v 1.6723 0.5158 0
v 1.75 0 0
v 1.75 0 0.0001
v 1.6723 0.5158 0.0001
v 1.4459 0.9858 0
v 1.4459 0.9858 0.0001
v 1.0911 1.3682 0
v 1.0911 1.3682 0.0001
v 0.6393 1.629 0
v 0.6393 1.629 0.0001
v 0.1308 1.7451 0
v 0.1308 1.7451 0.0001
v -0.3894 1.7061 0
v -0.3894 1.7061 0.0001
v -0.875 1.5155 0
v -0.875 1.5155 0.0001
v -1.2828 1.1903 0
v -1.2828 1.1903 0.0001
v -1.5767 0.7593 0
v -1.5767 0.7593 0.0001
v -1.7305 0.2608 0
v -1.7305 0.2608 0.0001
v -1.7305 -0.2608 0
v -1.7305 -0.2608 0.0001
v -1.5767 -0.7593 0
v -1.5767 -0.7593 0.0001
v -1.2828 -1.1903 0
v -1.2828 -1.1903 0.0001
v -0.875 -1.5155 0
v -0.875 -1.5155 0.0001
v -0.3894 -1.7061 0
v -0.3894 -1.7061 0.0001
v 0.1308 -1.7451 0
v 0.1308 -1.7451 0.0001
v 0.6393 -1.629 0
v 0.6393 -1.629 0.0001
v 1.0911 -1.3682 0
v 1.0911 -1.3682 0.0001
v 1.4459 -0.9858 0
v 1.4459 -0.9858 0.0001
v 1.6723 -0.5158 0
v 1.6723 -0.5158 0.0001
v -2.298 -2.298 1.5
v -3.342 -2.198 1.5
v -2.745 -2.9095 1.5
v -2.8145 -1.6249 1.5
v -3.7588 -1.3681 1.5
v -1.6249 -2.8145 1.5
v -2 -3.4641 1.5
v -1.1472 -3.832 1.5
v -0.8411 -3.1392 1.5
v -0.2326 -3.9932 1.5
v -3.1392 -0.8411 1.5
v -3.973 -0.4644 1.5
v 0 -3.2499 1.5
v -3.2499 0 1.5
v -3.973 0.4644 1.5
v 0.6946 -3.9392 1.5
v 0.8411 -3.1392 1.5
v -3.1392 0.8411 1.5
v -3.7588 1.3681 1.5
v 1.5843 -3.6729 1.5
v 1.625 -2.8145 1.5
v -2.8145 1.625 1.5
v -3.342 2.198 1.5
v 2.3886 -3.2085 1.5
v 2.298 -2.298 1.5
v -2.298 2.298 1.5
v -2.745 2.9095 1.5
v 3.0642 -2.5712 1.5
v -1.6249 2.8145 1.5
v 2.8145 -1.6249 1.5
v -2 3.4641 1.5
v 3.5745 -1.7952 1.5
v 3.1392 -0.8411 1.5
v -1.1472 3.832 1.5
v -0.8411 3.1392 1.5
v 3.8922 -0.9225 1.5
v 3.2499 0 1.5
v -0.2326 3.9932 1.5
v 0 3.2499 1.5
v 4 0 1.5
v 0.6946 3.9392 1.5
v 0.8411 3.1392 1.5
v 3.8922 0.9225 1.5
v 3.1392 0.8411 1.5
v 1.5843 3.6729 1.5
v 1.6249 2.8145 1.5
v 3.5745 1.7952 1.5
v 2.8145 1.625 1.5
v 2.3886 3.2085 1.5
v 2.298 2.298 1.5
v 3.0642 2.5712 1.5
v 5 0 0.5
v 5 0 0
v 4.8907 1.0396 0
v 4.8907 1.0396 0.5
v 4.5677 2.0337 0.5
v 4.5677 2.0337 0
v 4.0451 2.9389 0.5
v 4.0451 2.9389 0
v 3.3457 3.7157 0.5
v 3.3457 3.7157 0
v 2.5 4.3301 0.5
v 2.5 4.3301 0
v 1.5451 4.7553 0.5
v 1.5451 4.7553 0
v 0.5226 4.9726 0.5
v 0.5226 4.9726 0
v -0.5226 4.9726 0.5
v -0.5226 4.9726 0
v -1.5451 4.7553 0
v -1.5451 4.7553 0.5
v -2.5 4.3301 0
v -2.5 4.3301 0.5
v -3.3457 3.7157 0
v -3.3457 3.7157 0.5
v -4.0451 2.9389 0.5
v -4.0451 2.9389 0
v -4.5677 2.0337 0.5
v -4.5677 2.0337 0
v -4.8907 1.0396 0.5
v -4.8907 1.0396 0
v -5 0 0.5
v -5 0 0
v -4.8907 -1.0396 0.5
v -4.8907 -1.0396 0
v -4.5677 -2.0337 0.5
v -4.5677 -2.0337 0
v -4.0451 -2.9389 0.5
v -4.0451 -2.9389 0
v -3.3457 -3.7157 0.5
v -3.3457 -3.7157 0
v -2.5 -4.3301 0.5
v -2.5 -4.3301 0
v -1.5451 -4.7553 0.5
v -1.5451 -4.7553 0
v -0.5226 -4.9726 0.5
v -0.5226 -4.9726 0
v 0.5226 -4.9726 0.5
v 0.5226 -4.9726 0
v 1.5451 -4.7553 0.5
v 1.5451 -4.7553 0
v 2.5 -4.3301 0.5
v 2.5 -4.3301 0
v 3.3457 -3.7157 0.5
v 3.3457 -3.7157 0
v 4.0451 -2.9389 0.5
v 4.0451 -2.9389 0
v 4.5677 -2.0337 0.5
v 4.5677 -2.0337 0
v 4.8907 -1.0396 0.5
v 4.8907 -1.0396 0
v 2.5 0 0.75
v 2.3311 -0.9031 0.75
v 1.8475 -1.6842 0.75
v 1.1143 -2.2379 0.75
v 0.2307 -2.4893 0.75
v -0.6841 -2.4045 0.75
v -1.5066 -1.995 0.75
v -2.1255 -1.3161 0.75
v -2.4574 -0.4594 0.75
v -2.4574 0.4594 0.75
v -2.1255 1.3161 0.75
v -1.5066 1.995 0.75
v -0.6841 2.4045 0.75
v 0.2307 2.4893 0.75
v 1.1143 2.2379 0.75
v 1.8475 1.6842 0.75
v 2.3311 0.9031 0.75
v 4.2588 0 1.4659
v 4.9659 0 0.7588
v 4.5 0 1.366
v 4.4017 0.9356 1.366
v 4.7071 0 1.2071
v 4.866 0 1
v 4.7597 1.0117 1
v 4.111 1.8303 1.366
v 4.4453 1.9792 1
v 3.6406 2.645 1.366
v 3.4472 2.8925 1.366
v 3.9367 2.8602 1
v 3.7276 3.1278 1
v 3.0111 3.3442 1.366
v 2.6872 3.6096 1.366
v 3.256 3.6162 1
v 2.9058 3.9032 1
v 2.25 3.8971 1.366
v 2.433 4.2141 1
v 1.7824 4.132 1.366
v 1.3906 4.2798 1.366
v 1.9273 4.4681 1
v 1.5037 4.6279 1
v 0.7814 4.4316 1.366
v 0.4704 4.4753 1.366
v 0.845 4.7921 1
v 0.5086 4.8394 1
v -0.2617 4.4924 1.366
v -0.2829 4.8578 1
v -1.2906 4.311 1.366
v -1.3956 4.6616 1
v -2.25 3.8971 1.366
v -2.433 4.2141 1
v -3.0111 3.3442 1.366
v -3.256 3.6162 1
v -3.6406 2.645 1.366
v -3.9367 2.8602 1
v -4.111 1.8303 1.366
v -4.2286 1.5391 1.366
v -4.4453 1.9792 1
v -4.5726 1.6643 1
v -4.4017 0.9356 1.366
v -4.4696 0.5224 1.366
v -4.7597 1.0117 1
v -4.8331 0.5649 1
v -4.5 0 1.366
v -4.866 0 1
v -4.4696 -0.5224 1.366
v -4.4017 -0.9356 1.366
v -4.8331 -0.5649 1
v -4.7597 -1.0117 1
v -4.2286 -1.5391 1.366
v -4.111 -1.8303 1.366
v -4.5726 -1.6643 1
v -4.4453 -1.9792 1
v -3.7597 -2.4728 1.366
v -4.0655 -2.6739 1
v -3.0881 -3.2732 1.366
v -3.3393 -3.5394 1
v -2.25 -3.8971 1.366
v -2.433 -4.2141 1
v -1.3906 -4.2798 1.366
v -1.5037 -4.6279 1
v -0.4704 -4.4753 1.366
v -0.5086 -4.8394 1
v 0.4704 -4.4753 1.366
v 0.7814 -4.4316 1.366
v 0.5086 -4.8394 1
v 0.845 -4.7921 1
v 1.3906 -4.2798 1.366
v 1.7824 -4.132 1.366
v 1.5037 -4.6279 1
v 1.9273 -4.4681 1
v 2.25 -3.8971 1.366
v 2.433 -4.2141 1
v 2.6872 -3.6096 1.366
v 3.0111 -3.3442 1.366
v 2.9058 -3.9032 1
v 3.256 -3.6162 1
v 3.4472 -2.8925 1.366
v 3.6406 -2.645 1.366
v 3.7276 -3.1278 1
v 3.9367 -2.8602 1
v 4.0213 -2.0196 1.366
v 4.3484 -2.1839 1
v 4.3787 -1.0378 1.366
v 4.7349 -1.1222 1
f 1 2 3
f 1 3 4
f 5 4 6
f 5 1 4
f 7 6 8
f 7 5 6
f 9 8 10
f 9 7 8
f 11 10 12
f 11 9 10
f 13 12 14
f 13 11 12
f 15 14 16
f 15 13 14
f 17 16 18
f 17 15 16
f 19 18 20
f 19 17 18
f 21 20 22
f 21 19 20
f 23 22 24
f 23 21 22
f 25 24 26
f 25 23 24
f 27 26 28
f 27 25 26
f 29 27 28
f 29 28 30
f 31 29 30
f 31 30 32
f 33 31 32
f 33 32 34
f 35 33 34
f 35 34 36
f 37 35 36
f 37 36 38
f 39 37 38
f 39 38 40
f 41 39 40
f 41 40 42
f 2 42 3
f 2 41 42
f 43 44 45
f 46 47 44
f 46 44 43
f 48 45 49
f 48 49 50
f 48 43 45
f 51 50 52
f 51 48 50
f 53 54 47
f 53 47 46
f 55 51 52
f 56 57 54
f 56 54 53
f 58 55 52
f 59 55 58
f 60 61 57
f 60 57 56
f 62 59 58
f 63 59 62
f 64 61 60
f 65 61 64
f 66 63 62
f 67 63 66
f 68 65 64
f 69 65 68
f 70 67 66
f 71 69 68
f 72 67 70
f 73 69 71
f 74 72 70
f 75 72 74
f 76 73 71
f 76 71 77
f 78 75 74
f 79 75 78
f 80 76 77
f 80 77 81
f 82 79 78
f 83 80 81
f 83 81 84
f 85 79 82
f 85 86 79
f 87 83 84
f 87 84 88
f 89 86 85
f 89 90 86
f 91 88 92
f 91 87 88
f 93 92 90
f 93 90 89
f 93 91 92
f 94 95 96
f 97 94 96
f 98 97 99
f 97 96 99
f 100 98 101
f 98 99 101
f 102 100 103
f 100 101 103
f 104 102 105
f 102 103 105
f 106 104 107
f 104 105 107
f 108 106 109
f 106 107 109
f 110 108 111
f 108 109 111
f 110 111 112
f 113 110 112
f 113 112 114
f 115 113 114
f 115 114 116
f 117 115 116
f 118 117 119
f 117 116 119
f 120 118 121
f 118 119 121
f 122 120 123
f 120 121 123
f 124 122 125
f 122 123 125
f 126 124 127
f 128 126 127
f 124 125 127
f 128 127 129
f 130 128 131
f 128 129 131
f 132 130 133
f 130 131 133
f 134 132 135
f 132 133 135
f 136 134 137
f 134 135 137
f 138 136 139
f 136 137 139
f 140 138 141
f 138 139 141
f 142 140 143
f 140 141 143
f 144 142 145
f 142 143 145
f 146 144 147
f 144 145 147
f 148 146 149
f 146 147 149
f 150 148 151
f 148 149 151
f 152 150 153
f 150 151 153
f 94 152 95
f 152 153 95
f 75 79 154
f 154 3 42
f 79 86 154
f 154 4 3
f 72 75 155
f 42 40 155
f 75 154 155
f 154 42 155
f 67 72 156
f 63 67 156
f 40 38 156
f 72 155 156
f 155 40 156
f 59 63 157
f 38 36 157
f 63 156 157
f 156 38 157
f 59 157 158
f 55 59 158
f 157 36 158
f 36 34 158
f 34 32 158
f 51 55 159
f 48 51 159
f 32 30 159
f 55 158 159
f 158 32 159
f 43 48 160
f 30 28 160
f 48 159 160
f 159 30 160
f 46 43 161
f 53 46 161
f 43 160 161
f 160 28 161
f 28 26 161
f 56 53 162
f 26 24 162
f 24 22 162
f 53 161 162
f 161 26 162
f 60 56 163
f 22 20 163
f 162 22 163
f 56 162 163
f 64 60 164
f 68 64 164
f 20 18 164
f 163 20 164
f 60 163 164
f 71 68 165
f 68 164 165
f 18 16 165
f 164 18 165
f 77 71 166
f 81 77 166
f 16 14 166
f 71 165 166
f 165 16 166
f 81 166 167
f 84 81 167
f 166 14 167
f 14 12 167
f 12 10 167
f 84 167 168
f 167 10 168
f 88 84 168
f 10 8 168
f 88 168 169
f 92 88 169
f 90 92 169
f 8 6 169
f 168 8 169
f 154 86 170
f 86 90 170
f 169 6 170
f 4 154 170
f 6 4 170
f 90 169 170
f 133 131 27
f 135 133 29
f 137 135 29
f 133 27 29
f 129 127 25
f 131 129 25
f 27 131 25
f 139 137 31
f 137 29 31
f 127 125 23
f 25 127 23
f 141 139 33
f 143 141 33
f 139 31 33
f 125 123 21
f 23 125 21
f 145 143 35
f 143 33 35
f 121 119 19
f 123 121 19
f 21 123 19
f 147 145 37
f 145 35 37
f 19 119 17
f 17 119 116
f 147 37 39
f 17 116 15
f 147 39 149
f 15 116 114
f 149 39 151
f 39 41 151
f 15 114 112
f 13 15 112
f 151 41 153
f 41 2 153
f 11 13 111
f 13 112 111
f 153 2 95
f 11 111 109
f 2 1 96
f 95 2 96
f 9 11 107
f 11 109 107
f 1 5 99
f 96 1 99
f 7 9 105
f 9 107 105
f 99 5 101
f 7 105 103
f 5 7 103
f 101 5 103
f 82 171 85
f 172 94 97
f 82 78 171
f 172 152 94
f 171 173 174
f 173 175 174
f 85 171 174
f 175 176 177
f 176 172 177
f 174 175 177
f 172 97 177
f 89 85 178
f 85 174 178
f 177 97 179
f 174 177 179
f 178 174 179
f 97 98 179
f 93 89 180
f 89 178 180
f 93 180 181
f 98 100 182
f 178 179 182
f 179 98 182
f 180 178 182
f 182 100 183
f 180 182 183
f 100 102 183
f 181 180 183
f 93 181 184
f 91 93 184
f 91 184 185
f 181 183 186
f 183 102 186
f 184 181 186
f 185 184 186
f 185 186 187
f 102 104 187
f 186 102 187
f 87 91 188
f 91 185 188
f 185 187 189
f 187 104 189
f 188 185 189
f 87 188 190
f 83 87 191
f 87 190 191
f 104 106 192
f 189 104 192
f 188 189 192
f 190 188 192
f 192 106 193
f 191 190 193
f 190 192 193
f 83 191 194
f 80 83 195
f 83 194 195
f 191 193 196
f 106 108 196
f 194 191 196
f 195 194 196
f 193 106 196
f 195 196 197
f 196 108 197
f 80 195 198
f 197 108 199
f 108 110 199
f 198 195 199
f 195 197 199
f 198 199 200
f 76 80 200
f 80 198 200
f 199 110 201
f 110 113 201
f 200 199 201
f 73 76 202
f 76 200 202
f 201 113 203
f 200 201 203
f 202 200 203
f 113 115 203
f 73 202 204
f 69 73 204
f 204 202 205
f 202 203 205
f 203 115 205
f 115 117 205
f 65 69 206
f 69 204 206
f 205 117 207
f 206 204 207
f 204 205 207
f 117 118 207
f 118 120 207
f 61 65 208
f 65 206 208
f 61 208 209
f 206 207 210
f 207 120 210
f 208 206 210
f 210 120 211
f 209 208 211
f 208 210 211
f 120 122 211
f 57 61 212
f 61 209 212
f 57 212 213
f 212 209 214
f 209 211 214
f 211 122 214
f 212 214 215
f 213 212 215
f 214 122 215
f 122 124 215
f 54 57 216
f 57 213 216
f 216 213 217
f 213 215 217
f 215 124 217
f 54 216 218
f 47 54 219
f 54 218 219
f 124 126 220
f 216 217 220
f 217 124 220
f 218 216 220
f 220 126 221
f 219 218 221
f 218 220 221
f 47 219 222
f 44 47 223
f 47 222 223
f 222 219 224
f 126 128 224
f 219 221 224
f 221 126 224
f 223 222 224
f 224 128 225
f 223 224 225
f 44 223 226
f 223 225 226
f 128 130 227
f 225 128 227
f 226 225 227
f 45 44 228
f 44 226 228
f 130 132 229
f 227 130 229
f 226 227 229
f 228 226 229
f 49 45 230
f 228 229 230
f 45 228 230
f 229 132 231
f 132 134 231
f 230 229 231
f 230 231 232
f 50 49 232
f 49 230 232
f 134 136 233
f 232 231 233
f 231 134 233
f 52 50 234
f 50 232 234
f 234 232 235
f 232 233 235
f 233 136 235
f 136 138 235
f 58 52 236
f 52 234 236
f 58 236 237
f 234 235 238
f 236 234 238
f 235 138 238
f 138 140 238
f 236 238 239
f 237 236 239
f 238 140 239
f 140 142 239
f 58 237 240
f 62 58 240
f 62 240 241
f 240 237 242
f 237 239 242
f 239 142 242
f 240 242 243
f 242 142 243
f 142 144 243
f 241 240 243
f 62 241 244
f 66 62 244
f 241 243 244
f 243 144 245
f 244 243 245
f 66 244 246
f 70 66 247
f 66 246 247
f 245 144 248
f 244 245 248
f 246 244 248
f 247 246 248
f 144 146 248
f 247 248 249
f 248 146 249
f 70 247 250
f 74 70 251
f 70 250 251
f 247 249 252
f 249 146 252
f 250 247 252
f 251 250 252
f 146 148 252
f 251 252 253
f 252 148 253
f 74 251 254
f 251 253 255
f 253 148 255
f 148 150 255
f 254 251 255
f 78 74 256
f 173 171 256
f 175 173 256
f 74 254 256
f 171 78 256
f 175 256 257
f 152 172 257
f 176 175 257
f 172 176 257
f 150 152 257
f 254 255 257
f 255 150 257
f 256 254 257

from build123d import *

# Parameters (mm, degrees)
SKETCH1_R           = 5
BOSS_EXTRUDE1_DEPTH = 1.5
SKETCH2_R           = 1.75
CUT_EXTRUDE1_DEPTH  = 8.228416147
CHAMFER1_SIZE       = 1.5
FILLET1_R           = 1


with BuildPart() as part:
    # Sketch1 → Boss-Extrude1 (new body)
    with BuildSketch(Plane.XY):
        Circle(SKETCH1_R)
    extrude(amount=BOSS_EXTRUDE1_DEPTH)

    # Sketch2 → Cut-Extrude1 (cut, through all)
    with BuildSketch(Plane.XY):
        Circle(SKETCH2_R)
    extrude(amount=CUT_EXTRUDE1_DEPTH, mode=Mode.SUBTRACT)

    # Chamfer1
    chamfer1_edges = [part.edges().sort_by_distance(p)[0] for p in [
        (-1.75, 0, 1.5),
    ]]
    chamfer(chamfer1_edges, length=CHAMFER1_SIZE - 0.0001)  # a hair under: the kernel refuses the full size

    # Fillet1
    fillet1_edges = [part.edges().sort_by_distance(p)[0] for p in [
        (-5, 0, 1.5),
    ]]
    fillet(fillet1_edges, radius=FILLET1_R)


solid = part.part
